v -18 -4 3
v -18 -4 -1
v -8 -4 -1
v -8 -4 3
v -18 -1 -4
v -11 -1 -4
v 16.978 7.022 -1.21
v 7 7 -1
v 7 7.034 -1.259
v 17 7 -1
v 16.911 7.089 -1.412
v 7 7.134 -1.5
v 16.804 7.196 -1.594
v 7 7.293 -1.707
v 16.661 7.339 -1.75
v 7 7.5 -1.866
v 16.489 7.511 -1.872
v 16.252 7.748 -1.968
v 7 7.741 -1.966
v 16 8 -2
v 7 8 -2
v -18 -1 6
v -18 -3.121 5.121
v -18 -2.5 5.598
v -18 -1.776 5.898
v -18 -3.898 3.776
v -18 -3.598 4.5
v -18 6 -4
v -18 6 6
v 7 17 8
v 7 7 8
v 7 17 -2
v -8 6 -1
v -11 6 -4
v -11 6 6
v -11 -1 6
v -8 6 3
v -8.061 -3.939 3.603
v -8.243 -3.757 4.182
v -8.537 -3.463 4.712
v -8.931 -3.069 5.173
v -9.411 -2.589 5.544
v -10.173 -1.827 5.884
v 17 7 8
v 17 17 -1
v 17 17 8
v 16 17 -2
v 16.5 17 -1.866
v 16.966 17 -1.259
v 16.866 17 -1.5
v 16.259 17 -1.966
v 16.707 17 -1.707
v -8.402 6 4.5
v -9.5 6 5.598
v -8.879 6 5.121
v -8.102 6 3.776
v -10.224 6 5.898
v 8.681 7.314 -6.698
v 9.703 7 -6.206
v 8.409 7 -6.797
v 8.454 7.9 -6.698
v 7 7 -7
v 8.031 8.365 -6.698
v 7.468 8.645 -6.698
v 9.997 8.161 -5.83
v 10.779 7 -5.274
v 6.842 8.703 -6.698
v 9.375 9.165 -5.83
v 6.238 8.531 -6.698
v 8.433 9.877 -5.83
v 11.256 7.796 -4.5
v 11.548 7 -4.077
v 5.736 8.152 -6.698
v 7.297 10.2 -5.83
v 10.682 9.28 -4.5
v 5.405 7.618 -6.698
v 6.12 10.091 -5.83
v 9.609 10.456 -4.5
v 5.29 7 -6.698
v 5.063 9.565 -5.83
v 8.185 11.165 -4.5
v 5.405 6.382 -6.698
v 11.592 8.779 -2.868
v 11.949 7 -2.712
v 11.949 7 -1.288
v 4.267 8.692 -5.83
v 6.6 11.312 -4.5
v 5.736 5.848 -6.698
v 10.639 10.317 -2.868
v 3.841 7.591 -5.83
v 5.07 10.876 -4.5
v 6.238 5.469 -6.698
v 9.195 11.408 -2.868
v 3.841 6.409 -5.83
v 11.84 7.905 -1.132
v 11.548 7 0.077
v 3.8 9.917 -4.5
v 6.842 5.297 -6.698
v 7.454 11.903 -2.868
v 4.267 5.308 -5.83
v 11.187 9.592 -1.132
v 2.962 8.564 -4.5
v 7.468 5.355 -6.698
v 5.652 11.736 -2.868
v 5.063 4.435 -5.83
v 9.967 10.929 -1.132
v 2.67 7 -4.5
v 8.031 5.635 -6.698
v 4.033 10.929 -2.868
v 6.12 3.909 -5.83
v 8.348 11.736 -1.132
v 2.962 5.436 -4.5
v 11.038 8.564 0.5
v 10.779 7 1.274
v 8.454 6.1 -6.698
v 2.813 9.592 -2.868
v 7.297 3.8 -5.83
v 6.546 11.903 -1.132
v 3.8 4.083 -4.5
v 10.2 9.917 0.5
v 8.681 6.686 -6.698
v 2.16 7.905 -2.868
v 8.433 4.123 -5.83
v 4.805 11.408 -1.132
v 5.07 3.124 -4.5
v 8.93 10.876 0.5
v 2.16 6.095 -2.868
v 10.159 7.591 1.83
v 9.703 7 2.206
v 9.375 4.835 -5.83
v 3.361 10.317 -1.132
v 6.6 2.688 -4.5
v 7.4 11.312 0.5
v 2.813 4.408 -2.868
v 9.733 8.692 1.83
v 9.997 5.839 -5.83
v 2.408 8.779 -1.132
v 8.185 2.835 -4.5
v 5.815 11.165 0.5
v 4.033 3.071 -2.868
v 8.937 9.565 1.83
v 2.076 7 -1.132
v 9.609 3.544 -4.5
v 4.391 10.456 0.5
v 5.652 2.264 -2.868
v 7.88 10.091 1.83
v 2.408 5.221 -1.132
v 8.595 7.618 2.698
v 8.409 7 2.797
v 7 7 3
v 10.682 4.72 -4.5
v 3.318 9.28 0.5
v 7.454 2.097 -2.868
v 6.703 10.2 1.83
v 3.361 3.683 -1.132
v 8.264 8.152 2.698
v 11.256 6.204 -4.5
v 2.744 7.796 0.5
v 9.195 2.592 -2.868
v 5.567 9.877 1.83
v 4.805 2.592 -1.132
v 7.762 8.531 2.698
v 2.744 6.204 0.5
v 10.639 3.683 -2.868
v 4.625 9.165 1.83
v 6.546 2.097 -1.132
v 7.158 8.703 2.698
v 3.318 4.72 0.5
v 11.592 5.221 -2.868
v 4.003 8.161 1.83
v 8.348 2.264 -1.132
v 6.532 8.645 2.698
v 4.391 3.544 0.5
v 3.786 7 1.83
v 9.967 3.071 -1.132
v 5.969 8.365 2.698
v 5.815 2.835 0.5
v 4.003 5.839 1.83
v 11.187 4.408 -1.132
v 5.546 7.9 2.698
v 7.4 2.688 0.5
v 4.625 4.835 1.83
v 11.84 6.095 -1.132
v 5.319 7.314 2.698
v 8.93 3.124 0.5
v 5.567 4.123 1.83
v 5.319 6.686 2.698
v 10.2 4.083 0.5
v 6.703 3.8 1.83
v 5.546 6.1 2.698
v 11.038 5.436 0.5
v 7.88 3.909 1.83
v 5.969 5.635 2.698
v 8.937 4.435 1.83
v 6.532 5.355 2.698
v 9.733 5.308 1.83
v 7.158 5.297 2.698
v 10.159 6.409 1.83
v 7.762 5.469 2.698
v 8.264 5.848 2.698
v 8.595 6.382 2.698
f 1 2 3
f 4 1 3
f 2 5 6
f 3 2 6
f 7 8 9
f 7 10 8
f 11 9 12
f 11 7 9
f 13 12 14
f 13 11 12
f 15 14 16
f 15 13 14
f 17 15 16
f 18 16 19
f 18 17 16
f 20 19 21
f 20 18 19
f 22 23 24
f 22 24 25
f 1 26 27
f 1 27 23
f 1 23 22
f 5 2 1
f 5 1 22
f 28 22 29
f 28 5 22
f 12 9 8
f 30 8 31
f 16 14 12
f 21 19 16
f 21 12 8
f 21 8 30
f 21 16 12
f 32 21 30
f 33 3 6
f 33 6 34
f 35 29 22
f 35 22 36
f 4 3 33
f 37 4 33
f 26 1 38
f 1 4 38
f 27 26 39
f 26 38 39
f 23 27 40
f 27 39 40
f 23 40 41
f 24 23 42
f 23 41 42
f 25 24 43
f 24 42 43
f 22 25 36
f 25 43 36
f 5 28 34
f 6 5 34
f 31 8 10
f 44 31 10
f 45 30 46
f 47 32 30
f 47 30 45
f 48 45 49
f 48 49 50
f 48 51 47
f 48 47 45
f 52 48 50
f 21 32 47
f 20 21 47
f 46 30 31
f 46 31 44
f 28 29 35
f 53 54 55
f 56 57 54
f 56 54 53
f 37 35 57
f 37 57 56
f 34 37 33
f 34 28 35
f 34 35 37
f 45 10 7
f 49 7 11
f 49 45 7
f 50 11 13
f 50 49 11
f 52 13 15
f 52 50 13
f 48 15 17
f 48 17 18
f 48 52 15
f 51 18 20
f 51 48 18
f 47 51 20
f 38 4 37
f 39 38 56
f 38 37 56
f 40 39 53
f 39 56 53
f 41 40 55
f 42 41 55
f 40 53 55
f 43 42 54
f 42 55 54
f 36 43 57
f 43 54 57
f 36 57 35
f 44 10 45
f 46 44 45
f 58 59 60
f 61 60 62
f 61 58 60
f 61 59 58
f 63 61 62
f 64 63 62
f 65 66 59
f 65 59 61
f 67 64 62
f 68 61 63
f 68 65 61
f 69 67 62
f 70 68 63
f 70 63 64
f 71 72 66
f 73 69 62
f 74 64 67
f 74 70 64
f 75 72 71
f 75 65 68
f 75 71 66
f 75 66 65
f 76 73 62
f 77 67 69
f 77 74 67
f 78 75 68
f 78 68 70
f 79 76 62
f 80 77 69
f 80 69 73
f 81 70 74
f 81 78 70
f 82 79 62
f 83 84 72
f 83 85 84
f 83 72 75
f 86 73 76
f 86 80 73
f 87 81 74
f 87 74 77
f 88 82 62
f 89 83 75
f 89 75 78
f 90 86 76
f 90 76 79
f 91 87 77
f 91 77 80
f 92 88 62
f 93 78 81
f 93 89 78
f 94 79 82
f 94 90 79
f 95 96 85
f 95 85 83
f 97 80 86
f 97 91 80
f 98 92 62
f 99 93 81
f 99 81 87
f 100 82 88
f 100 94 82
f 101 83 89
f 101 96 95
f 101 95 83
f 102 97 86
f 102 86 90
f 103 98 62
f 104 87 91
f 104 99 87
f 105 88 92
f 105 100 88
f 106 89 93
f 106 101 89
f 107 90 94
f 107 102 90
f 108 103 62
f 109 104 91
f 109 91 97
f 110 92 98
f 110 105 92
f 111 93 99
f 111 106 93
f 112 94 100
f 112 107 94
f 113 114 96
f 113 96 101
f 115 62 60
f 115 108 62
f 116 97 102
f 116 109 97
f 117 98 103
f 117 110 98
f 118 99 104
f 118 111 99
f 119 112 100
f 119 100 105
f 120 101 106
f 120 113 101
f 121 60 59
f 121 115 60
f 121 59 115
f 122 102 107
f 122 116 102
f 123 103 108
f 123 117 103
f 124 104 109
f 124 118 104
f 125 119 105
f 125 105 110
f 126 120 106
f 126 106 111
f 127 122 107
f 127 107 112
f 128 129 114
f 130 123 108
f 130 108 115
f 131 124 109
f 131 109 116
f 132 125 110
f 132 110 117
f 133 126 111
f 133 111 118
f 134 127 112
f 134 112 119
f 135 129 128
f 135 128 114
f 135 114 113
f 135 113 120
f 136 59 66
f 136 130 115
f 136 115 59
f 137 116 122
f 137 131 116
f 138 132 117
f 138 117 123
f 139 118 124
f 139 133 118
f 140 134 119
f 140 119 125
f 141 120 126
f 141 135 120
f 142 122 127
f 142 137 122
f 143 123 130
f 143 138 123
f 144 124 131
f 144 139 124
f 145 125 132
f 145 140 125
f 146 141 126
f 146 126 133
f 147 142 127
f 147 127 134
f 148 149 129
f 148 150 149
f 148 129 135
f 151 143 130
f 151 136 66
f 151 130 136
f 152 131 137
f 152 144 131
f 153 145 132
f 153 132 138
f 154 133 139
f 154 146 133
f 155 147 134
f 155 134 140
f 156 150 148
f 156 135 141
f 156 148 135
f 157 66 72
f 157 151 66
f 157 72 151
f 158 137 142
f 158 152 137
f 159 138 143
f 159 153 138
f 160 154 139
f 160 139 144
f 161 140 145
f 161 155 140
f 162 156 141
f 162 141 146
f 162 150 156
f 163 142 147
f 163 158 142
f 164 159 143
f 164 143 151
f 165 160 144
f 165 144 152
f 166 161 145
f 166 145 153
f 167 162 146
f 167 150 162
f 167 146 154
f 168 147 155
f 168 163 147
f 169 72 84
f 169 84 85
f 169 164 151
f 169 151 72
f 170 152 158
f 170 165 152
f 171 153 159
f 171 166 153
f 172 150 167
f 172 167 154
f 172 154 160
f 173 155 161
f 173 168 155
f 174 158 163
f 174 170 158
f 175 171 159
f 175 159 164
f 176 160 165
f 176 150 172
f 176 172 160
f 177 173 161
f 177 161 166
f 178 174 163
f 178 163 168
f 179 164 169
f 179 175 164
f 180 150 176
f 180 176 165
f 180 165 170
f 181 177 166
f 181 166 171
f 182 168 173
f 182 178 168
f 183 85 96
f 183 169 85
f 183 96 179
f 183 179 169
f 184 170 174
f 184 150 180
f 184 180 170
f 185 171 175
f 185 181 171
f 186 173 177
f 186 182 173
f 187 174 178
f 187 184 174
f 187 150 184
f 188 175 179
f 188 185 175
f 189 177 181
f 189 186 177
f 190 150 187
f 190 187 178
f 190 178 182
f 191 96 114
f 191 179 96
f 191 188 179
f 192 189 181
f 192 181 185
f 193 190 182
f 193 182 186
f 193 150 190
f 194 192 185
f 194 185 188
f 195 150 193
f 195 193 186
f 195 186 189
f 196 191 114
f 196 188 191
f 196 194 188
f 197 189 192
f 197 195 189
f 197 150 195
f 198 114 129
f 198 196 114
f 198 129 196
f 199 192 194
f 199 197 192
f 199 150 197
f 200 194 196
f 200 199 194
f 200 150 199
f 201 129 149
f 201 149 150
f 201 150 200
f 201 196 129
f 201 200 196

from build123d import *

# Parameters (mm, degrees)
BOX001_W     = 10
BOX001_H     = 10
BOX001_DEPTH = 10
FILLET_R     = 3
CHAMFER_SIZE = 3
BOX_W        = 10
BOX_H        = 10
BOX_DEPTH    = 10
FILLET001_R  = 1


with BuildPart() as sphere:
    # Sphere → Sphere (revolve)
    with BuildSketch(Plane(origin=(7, 7, -2), x_dir=(1, 0, 0), z_dir=(0, -1, 0))):
        with BuildLine():
            ThreePointArc((0, -5), (5, 0), (0, 5))
            Line((0, 5), (0, -5))
        make_face()
    revolve(axis=Axis((7, 7, -2), (0, 0, 1)))


with BuildPart() as chamfer_body:
    # Box001 → Box001 (new body)
    with BuildSketch(Plane(origin=(-18, -4, -4), x_dir=(1, 0, 0), z_dir=(0, 0, 1))):
        with Locations((5, 5)):
            Rectangle(BOX001_W, BOX001_H)
    extrude(amount=BOX001_DEPTH)

    # Fillet
    fillet_edges = [chamfer_body.edges().sort_by_distance(p)[0] for p in [
        (-8, 1, 6),
        (-13, -4, 6),
    ]]
    fillet(fillet_edges, radius=FILLET_R)

    # Chamfer
    chamfer_edges = [chamfer_body.edges().sort_by_distance(p)[0] for p in [
        (-13, -4, -4),
        (-8, 1, -4),
    ]]
    chamfer(chamfer_edges, length=CHAMFER_SIZE)


with BuildPart() as fillet001:
    # Box → Box (new body)
    with BuildSketch(Plane(origin=(7, 7, -2), x_dir=(1, 0, 0), z_dir=(0, 0, 1))):
        with Locations((5, 5)):
            Rectangle(BOX_W, BOX_H)
    extrude(amount=BOX_DEPTH)

    # Fillet001
    fillet001_edges = [fillet001.edges().sort_by_distance(p)[0] for p in [
        (17, 12, -2),
        (12, 7, -2),
    ]]
    fillet(fillet001_edges, radius=FILLET001_R)


solid = Compound([sphere.part, chamfer_body.part, fillet001.part])
